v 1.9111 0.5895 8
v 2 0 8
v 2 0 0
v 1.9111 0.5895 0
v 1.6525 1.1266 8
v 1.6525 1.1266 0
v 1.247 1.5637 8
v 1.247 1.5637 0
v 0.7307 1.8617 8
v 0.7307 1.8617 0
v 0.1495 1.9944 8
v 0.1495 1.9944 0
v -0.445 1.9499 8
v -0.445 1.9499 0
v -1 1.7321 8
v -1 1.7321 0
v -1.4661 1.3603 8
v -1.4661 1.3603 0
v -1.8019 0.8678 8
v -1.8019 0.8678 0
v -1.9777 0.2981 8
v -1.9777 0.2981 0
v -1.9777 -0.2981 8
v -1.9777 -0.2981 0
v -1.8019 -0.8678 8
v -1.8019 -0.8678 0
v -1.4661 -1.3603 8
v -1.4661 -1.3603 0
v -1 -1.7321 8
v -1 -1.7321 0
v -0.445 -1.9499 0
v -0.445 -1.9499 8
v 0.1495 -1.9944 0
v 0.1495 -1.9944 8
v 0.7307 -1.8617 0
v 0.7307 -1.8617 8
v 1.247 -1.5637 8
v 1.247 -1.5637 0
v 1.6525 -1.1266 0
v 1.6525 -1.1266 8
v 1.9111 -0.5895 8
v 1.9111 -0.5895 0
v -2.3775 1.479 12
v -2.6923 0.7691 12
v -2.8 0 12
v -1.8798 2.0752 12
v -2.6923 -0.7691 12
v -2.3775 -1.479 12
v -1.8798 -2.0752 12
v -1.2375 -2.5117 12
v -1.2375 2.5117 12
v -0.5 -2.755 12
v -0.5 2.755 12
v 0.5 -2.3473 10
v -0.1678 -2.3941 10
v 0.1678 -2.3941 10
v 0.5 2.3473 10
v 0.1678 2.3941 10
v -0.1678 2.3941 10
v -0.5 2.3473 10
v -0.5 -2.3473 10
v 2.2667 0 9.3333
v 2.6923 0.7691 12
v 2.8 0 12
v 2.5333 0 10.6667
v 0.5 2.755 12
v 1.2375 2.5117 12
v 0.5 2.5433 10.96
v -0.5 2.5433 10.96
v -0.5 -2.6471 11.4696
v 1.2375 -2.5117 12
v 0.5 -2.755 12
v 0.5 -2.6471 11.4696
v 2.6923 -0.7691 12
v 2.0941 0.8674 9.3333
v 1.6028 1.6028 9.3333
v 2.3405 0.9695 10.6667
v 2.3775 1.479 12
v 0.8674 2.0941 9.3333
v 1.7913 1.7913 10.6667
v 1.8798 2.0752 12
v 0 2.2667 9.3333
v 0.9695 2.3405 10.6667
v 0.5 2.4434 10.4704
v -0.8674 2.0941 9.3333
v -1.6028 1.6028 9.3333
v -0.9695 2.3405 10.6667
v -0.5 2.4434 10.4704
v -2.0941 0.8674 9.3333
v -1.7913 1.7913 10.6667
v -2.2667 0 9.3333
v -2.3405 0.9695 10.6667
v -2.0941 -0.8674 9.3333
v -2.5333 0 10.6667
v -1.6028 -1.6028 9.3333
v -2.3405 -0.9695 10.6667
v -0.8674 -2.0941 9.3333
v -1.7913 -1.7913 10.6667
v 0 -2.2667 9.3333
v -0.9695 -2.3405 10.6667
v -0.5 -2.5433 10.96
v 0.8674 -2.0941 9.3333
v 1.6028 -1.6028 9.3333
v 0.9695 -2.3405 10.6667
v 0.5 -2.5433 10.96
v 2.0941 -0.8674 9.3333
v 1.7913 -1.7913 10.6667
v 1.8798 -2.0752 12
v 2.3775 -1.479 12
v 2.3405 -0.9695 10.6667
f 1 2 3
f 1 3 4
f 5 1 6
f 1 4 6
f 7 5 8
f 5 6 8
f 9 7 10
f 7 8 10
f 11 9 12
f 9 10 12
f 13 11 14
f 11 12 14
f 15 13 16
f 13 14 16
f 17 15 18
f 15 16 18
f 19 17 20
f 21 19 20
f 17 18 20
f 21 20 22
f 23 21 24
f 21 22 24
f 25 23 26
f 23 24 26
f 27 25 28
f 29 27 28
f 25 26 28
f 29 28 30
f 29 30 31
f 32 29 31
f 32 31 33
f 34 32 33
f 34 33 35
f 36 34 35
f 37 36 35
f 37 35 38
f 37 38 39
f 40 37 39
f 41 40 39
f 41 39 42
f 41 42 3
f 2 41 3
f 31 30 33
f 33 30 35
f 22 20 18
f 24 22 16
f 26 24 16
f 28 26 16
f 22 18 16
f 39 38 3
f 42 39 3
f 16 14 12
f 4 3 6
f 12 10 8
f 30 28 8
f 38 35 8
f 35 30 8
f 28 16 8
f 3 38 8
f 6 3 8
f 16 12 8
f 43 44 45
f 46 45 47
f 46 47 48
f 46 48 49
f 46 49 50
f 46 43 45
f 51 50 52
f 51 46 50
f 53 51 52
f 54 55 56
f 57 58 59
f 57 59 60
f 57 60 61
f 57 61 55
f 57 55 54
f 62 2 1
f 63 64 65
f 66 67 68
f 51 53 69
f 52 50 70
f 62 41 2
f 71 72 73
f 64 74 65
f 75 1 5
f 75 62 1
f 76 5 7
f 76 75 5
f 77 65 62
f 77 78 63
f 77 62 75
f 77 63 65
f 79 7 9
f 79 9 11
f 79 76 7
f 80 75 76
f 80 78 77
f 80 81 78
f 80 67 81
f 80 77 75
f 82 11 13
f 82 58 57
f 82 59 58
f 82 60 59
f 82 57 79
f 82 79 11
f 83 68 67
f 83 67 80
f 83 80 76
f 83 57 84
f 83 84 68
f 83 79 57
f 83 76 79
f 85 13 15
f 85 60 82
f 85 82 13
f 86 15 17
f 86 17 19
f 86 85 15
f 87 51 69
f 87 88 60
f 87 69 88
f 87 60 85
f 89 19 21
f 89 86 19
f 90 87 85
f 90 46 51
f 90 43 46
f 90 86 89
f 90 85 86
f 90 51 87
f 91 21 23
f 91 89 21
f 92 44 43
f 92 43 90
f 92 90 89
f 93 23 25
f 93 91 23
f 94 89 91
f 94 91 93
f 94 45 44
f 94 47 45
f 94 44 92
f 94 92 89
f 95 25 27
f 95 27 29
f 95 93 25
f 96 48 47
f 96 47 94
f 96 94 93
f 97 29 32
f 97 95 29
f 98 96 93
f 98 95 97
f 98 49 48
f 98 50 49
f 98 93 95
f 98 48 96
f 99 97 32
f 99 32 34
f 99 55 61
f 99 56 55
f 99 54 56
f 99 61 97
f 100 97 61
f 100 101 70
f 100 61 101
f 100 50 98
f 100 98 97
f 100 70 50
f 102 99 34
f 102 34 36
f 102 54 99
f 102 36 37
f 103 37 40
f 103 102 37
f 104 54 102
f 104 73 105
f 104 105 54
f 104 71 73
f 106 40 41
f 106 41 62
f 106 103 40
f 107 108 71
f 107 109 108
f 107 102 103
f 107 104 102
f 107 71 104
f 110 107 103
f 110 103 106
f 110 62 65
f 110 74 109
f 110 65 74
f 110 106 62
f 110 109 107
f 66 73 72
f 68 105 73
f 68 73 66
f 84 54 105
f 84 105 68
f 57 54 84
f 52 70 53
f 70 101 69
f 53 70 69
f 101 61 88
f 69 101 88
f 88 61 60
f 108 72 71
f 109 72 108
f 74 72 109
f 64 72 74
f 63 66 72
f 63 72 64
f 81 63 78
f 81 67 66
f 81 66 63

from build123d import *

# Parameters (mm, degrees)
BOX_W          = 1
BOX_H          = 10
BOX_DEPTH      = 2
CYLINDER_R     = 2
CYLINDER_DEPTH = 10


with BuildPart() as cubo:
    # Box → Box (new body)
    with BuildSketch(Plane(origin=(-0.5, -5, 10), x_dir=(1, 0, 0), z_dir=(0, 0, 1))):
        with Locations((0.5, 5)):
            Rectangle(BOX_W, BOX_H)
    extrude(amount=BOX_DEPTH)


with BuildPart() as cut:
    # Cone → Cone (revolve)
    with BuildSketch(Plane(origin=(0, 0, 8), x_dir=(1, 0, 0), z_dir=(0, -1, 0))):
        Polygon((0, 0), (2, 0), (2.8, 4), (0, 4), align=None)
    revolve(axis=Axis((0, 0, 8), (0, 0, 1)))

    # Cut: cut Cubo
    add(cubo.part, mode=Mode.SUBTRACT)


with BuildPart() as fusion:
    # Cylinder → Cylinder (new body)
    with BuildSketch(Plane.XY):
        Circle(CYLINDER_R)
    extrude(amount=CYLINDER_DEPTH)

    # Fusion: union Cut
    add(cut.part)


solid = fusion.part
